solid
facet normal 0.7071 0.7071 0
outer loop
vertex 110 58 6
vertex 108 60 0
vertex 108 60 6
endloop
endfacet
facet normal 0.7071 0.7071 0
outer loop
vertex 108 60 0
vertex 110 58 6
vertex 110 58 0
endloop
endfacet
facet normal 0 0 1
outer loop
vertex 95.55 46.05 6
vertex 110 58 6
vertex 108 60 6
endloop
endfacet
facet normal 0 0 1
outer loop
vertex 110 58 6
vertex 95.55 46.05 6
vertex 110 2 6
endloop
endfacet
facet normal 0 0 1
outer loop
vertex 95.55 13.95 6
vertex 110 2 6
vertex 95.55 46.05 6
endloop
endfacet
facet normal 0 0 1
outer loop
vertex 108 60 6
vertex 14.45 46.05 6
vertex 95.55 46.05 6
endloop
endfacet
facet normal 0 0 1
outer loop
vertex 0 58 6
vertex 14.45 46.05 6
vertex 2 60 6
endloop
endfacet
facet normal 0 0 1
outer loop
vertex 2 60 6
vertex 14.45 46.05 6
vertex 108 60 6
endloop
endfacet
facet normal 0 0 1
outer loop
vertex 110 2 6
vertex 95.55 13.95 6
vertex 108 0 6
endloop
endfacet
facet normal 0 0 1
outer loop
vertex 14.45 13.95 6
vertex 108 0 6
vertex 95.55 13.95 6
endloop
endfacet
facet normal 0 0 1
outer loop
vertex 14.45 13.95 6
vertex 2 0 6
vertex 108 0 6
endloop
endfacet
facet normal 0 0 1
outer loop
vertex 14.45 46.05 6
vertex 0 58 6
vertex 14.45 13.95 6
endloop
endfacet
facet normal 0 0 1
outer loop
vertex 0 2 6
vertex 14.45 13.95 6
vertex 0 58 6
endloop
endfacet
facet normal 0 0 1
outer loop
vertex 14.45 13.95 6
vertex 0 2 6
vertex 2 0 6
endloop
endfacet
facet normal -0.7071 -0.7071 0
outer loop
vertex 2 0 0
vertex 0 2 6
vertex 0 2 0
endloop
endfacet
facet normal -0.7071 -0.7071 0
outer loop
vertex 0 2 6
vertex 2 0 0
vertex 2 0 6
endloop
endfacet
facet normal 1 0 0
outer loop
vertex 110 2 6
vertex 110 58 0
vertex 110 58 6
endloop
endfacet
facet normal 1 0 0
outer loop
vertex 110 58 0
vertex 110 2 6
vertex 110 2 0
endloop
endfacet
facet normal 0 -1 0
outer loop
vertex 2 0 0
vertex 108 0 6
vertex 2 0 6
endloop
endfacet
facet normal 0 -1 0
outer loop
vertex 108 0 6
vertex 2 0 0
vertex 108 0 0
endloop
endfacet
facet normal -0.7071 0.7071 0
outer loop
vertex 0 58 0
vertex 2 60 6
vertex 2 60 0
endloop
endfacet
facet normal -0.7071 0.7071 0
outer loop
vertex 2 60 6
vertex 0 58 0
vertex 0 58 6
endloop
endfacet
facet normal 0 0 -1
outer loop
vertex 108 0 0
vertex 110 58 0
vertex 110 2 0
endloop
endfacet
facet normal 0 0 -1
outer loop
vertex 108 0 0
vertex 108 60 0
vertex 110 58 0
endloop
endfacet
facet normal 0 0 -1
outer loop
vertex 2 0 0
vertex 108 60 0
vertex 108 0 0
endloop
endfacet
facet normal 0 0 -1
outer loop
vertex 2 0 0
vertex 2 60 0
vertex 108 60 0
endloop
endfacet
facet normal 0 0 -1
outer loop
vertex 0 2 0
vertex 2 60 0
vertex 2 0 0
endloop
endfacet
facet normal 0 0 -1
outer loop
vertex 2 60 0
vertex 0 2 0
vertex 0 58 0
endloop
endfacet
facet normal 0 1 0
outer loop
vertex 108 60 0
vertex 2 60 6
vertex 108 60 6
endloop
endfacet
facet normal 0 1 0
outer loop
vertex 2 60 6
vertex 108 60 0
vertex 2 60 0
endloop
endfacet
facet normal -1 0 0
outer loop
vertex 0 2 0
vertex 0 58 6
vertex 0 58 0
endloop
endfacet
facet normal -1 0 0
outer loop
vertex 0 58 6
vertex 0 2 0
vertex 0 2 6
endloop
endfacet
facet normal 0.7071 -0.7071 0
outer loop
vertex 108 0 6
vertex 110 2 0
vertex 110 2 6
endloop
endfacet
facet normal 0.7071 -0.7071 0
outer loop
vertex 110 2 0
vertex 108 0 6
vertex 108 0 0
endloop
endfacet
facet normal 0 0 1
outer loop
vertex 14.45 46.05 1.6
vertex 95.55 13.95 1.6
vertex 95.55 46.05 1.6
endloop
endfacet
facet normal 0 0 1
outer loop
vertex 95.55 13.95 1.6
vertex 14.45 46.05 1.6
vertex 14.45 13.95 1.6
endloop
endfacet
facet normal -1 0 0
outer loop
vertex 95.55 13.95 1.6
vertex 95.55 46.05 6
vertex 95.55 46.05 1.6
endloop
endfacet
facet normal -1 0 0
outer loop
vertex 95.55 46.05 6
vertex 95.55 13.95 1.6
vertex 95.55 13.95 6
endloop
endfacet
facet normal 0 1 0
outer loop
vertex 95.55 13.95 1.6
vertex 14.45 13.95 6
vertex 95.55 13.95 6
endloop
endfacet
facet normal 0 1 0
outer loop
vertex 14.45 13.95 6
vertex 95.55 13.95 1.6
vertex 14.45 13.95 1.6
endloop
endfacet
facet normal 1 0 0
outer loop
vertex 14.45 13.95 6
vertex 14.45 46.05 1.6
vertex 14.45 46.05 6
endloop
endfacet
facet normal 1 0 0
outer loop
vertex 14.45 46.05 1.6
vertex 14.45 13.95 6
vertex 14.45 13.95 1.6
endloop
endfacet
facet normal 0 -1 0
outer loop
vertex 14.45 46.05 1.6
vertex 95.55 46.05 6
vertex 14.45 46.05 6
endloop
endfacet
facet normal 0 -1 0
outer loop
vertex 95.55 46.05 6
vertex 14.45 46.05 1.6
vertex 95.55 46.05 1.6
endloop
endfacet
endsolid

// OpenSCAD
$fn = 32;

// ----------------------------------------------------------------------
// Windowed plate: 1 voids, 110 x 60 x 6 mm
// ----------------------------------------------------------------------

// --- parameters (mm) ---
plate_l = 110;            // plate length, X
plate_w = 60;             // plate width, Y
plate_t = 6;              // plate thickness, Z
edge_margin = 10;         // wall from the plate edge to any window
win1_l = 81.1;            // window length
win1_w = 32.1;            // window width
depth_1 = 4.4;            // depth of void 1 (full thickness = through)
corner_c = 2;             // corner chamfer of the plate

profile = [[2, 0], [108, 0], [110, 2], [110, 58], [108, 60], [2, 60], [0, 58], [0, 2]];  // primary outline, 8 points, counter clockwise
void_1 = [[14.45, 13.95], [95.55, 13.95], [95.55, 46.05], [14.45, 46.05]];  // large central window, 4 points

// --- the one profile operation ---
difference() {
  linear_extrude(height = plate_t) polygon(points = profile);
  translate([0, 0, plate_t - depth_1])
    linear_extrude(height = depth_1 + 1) polygon(points = void_1);
}
